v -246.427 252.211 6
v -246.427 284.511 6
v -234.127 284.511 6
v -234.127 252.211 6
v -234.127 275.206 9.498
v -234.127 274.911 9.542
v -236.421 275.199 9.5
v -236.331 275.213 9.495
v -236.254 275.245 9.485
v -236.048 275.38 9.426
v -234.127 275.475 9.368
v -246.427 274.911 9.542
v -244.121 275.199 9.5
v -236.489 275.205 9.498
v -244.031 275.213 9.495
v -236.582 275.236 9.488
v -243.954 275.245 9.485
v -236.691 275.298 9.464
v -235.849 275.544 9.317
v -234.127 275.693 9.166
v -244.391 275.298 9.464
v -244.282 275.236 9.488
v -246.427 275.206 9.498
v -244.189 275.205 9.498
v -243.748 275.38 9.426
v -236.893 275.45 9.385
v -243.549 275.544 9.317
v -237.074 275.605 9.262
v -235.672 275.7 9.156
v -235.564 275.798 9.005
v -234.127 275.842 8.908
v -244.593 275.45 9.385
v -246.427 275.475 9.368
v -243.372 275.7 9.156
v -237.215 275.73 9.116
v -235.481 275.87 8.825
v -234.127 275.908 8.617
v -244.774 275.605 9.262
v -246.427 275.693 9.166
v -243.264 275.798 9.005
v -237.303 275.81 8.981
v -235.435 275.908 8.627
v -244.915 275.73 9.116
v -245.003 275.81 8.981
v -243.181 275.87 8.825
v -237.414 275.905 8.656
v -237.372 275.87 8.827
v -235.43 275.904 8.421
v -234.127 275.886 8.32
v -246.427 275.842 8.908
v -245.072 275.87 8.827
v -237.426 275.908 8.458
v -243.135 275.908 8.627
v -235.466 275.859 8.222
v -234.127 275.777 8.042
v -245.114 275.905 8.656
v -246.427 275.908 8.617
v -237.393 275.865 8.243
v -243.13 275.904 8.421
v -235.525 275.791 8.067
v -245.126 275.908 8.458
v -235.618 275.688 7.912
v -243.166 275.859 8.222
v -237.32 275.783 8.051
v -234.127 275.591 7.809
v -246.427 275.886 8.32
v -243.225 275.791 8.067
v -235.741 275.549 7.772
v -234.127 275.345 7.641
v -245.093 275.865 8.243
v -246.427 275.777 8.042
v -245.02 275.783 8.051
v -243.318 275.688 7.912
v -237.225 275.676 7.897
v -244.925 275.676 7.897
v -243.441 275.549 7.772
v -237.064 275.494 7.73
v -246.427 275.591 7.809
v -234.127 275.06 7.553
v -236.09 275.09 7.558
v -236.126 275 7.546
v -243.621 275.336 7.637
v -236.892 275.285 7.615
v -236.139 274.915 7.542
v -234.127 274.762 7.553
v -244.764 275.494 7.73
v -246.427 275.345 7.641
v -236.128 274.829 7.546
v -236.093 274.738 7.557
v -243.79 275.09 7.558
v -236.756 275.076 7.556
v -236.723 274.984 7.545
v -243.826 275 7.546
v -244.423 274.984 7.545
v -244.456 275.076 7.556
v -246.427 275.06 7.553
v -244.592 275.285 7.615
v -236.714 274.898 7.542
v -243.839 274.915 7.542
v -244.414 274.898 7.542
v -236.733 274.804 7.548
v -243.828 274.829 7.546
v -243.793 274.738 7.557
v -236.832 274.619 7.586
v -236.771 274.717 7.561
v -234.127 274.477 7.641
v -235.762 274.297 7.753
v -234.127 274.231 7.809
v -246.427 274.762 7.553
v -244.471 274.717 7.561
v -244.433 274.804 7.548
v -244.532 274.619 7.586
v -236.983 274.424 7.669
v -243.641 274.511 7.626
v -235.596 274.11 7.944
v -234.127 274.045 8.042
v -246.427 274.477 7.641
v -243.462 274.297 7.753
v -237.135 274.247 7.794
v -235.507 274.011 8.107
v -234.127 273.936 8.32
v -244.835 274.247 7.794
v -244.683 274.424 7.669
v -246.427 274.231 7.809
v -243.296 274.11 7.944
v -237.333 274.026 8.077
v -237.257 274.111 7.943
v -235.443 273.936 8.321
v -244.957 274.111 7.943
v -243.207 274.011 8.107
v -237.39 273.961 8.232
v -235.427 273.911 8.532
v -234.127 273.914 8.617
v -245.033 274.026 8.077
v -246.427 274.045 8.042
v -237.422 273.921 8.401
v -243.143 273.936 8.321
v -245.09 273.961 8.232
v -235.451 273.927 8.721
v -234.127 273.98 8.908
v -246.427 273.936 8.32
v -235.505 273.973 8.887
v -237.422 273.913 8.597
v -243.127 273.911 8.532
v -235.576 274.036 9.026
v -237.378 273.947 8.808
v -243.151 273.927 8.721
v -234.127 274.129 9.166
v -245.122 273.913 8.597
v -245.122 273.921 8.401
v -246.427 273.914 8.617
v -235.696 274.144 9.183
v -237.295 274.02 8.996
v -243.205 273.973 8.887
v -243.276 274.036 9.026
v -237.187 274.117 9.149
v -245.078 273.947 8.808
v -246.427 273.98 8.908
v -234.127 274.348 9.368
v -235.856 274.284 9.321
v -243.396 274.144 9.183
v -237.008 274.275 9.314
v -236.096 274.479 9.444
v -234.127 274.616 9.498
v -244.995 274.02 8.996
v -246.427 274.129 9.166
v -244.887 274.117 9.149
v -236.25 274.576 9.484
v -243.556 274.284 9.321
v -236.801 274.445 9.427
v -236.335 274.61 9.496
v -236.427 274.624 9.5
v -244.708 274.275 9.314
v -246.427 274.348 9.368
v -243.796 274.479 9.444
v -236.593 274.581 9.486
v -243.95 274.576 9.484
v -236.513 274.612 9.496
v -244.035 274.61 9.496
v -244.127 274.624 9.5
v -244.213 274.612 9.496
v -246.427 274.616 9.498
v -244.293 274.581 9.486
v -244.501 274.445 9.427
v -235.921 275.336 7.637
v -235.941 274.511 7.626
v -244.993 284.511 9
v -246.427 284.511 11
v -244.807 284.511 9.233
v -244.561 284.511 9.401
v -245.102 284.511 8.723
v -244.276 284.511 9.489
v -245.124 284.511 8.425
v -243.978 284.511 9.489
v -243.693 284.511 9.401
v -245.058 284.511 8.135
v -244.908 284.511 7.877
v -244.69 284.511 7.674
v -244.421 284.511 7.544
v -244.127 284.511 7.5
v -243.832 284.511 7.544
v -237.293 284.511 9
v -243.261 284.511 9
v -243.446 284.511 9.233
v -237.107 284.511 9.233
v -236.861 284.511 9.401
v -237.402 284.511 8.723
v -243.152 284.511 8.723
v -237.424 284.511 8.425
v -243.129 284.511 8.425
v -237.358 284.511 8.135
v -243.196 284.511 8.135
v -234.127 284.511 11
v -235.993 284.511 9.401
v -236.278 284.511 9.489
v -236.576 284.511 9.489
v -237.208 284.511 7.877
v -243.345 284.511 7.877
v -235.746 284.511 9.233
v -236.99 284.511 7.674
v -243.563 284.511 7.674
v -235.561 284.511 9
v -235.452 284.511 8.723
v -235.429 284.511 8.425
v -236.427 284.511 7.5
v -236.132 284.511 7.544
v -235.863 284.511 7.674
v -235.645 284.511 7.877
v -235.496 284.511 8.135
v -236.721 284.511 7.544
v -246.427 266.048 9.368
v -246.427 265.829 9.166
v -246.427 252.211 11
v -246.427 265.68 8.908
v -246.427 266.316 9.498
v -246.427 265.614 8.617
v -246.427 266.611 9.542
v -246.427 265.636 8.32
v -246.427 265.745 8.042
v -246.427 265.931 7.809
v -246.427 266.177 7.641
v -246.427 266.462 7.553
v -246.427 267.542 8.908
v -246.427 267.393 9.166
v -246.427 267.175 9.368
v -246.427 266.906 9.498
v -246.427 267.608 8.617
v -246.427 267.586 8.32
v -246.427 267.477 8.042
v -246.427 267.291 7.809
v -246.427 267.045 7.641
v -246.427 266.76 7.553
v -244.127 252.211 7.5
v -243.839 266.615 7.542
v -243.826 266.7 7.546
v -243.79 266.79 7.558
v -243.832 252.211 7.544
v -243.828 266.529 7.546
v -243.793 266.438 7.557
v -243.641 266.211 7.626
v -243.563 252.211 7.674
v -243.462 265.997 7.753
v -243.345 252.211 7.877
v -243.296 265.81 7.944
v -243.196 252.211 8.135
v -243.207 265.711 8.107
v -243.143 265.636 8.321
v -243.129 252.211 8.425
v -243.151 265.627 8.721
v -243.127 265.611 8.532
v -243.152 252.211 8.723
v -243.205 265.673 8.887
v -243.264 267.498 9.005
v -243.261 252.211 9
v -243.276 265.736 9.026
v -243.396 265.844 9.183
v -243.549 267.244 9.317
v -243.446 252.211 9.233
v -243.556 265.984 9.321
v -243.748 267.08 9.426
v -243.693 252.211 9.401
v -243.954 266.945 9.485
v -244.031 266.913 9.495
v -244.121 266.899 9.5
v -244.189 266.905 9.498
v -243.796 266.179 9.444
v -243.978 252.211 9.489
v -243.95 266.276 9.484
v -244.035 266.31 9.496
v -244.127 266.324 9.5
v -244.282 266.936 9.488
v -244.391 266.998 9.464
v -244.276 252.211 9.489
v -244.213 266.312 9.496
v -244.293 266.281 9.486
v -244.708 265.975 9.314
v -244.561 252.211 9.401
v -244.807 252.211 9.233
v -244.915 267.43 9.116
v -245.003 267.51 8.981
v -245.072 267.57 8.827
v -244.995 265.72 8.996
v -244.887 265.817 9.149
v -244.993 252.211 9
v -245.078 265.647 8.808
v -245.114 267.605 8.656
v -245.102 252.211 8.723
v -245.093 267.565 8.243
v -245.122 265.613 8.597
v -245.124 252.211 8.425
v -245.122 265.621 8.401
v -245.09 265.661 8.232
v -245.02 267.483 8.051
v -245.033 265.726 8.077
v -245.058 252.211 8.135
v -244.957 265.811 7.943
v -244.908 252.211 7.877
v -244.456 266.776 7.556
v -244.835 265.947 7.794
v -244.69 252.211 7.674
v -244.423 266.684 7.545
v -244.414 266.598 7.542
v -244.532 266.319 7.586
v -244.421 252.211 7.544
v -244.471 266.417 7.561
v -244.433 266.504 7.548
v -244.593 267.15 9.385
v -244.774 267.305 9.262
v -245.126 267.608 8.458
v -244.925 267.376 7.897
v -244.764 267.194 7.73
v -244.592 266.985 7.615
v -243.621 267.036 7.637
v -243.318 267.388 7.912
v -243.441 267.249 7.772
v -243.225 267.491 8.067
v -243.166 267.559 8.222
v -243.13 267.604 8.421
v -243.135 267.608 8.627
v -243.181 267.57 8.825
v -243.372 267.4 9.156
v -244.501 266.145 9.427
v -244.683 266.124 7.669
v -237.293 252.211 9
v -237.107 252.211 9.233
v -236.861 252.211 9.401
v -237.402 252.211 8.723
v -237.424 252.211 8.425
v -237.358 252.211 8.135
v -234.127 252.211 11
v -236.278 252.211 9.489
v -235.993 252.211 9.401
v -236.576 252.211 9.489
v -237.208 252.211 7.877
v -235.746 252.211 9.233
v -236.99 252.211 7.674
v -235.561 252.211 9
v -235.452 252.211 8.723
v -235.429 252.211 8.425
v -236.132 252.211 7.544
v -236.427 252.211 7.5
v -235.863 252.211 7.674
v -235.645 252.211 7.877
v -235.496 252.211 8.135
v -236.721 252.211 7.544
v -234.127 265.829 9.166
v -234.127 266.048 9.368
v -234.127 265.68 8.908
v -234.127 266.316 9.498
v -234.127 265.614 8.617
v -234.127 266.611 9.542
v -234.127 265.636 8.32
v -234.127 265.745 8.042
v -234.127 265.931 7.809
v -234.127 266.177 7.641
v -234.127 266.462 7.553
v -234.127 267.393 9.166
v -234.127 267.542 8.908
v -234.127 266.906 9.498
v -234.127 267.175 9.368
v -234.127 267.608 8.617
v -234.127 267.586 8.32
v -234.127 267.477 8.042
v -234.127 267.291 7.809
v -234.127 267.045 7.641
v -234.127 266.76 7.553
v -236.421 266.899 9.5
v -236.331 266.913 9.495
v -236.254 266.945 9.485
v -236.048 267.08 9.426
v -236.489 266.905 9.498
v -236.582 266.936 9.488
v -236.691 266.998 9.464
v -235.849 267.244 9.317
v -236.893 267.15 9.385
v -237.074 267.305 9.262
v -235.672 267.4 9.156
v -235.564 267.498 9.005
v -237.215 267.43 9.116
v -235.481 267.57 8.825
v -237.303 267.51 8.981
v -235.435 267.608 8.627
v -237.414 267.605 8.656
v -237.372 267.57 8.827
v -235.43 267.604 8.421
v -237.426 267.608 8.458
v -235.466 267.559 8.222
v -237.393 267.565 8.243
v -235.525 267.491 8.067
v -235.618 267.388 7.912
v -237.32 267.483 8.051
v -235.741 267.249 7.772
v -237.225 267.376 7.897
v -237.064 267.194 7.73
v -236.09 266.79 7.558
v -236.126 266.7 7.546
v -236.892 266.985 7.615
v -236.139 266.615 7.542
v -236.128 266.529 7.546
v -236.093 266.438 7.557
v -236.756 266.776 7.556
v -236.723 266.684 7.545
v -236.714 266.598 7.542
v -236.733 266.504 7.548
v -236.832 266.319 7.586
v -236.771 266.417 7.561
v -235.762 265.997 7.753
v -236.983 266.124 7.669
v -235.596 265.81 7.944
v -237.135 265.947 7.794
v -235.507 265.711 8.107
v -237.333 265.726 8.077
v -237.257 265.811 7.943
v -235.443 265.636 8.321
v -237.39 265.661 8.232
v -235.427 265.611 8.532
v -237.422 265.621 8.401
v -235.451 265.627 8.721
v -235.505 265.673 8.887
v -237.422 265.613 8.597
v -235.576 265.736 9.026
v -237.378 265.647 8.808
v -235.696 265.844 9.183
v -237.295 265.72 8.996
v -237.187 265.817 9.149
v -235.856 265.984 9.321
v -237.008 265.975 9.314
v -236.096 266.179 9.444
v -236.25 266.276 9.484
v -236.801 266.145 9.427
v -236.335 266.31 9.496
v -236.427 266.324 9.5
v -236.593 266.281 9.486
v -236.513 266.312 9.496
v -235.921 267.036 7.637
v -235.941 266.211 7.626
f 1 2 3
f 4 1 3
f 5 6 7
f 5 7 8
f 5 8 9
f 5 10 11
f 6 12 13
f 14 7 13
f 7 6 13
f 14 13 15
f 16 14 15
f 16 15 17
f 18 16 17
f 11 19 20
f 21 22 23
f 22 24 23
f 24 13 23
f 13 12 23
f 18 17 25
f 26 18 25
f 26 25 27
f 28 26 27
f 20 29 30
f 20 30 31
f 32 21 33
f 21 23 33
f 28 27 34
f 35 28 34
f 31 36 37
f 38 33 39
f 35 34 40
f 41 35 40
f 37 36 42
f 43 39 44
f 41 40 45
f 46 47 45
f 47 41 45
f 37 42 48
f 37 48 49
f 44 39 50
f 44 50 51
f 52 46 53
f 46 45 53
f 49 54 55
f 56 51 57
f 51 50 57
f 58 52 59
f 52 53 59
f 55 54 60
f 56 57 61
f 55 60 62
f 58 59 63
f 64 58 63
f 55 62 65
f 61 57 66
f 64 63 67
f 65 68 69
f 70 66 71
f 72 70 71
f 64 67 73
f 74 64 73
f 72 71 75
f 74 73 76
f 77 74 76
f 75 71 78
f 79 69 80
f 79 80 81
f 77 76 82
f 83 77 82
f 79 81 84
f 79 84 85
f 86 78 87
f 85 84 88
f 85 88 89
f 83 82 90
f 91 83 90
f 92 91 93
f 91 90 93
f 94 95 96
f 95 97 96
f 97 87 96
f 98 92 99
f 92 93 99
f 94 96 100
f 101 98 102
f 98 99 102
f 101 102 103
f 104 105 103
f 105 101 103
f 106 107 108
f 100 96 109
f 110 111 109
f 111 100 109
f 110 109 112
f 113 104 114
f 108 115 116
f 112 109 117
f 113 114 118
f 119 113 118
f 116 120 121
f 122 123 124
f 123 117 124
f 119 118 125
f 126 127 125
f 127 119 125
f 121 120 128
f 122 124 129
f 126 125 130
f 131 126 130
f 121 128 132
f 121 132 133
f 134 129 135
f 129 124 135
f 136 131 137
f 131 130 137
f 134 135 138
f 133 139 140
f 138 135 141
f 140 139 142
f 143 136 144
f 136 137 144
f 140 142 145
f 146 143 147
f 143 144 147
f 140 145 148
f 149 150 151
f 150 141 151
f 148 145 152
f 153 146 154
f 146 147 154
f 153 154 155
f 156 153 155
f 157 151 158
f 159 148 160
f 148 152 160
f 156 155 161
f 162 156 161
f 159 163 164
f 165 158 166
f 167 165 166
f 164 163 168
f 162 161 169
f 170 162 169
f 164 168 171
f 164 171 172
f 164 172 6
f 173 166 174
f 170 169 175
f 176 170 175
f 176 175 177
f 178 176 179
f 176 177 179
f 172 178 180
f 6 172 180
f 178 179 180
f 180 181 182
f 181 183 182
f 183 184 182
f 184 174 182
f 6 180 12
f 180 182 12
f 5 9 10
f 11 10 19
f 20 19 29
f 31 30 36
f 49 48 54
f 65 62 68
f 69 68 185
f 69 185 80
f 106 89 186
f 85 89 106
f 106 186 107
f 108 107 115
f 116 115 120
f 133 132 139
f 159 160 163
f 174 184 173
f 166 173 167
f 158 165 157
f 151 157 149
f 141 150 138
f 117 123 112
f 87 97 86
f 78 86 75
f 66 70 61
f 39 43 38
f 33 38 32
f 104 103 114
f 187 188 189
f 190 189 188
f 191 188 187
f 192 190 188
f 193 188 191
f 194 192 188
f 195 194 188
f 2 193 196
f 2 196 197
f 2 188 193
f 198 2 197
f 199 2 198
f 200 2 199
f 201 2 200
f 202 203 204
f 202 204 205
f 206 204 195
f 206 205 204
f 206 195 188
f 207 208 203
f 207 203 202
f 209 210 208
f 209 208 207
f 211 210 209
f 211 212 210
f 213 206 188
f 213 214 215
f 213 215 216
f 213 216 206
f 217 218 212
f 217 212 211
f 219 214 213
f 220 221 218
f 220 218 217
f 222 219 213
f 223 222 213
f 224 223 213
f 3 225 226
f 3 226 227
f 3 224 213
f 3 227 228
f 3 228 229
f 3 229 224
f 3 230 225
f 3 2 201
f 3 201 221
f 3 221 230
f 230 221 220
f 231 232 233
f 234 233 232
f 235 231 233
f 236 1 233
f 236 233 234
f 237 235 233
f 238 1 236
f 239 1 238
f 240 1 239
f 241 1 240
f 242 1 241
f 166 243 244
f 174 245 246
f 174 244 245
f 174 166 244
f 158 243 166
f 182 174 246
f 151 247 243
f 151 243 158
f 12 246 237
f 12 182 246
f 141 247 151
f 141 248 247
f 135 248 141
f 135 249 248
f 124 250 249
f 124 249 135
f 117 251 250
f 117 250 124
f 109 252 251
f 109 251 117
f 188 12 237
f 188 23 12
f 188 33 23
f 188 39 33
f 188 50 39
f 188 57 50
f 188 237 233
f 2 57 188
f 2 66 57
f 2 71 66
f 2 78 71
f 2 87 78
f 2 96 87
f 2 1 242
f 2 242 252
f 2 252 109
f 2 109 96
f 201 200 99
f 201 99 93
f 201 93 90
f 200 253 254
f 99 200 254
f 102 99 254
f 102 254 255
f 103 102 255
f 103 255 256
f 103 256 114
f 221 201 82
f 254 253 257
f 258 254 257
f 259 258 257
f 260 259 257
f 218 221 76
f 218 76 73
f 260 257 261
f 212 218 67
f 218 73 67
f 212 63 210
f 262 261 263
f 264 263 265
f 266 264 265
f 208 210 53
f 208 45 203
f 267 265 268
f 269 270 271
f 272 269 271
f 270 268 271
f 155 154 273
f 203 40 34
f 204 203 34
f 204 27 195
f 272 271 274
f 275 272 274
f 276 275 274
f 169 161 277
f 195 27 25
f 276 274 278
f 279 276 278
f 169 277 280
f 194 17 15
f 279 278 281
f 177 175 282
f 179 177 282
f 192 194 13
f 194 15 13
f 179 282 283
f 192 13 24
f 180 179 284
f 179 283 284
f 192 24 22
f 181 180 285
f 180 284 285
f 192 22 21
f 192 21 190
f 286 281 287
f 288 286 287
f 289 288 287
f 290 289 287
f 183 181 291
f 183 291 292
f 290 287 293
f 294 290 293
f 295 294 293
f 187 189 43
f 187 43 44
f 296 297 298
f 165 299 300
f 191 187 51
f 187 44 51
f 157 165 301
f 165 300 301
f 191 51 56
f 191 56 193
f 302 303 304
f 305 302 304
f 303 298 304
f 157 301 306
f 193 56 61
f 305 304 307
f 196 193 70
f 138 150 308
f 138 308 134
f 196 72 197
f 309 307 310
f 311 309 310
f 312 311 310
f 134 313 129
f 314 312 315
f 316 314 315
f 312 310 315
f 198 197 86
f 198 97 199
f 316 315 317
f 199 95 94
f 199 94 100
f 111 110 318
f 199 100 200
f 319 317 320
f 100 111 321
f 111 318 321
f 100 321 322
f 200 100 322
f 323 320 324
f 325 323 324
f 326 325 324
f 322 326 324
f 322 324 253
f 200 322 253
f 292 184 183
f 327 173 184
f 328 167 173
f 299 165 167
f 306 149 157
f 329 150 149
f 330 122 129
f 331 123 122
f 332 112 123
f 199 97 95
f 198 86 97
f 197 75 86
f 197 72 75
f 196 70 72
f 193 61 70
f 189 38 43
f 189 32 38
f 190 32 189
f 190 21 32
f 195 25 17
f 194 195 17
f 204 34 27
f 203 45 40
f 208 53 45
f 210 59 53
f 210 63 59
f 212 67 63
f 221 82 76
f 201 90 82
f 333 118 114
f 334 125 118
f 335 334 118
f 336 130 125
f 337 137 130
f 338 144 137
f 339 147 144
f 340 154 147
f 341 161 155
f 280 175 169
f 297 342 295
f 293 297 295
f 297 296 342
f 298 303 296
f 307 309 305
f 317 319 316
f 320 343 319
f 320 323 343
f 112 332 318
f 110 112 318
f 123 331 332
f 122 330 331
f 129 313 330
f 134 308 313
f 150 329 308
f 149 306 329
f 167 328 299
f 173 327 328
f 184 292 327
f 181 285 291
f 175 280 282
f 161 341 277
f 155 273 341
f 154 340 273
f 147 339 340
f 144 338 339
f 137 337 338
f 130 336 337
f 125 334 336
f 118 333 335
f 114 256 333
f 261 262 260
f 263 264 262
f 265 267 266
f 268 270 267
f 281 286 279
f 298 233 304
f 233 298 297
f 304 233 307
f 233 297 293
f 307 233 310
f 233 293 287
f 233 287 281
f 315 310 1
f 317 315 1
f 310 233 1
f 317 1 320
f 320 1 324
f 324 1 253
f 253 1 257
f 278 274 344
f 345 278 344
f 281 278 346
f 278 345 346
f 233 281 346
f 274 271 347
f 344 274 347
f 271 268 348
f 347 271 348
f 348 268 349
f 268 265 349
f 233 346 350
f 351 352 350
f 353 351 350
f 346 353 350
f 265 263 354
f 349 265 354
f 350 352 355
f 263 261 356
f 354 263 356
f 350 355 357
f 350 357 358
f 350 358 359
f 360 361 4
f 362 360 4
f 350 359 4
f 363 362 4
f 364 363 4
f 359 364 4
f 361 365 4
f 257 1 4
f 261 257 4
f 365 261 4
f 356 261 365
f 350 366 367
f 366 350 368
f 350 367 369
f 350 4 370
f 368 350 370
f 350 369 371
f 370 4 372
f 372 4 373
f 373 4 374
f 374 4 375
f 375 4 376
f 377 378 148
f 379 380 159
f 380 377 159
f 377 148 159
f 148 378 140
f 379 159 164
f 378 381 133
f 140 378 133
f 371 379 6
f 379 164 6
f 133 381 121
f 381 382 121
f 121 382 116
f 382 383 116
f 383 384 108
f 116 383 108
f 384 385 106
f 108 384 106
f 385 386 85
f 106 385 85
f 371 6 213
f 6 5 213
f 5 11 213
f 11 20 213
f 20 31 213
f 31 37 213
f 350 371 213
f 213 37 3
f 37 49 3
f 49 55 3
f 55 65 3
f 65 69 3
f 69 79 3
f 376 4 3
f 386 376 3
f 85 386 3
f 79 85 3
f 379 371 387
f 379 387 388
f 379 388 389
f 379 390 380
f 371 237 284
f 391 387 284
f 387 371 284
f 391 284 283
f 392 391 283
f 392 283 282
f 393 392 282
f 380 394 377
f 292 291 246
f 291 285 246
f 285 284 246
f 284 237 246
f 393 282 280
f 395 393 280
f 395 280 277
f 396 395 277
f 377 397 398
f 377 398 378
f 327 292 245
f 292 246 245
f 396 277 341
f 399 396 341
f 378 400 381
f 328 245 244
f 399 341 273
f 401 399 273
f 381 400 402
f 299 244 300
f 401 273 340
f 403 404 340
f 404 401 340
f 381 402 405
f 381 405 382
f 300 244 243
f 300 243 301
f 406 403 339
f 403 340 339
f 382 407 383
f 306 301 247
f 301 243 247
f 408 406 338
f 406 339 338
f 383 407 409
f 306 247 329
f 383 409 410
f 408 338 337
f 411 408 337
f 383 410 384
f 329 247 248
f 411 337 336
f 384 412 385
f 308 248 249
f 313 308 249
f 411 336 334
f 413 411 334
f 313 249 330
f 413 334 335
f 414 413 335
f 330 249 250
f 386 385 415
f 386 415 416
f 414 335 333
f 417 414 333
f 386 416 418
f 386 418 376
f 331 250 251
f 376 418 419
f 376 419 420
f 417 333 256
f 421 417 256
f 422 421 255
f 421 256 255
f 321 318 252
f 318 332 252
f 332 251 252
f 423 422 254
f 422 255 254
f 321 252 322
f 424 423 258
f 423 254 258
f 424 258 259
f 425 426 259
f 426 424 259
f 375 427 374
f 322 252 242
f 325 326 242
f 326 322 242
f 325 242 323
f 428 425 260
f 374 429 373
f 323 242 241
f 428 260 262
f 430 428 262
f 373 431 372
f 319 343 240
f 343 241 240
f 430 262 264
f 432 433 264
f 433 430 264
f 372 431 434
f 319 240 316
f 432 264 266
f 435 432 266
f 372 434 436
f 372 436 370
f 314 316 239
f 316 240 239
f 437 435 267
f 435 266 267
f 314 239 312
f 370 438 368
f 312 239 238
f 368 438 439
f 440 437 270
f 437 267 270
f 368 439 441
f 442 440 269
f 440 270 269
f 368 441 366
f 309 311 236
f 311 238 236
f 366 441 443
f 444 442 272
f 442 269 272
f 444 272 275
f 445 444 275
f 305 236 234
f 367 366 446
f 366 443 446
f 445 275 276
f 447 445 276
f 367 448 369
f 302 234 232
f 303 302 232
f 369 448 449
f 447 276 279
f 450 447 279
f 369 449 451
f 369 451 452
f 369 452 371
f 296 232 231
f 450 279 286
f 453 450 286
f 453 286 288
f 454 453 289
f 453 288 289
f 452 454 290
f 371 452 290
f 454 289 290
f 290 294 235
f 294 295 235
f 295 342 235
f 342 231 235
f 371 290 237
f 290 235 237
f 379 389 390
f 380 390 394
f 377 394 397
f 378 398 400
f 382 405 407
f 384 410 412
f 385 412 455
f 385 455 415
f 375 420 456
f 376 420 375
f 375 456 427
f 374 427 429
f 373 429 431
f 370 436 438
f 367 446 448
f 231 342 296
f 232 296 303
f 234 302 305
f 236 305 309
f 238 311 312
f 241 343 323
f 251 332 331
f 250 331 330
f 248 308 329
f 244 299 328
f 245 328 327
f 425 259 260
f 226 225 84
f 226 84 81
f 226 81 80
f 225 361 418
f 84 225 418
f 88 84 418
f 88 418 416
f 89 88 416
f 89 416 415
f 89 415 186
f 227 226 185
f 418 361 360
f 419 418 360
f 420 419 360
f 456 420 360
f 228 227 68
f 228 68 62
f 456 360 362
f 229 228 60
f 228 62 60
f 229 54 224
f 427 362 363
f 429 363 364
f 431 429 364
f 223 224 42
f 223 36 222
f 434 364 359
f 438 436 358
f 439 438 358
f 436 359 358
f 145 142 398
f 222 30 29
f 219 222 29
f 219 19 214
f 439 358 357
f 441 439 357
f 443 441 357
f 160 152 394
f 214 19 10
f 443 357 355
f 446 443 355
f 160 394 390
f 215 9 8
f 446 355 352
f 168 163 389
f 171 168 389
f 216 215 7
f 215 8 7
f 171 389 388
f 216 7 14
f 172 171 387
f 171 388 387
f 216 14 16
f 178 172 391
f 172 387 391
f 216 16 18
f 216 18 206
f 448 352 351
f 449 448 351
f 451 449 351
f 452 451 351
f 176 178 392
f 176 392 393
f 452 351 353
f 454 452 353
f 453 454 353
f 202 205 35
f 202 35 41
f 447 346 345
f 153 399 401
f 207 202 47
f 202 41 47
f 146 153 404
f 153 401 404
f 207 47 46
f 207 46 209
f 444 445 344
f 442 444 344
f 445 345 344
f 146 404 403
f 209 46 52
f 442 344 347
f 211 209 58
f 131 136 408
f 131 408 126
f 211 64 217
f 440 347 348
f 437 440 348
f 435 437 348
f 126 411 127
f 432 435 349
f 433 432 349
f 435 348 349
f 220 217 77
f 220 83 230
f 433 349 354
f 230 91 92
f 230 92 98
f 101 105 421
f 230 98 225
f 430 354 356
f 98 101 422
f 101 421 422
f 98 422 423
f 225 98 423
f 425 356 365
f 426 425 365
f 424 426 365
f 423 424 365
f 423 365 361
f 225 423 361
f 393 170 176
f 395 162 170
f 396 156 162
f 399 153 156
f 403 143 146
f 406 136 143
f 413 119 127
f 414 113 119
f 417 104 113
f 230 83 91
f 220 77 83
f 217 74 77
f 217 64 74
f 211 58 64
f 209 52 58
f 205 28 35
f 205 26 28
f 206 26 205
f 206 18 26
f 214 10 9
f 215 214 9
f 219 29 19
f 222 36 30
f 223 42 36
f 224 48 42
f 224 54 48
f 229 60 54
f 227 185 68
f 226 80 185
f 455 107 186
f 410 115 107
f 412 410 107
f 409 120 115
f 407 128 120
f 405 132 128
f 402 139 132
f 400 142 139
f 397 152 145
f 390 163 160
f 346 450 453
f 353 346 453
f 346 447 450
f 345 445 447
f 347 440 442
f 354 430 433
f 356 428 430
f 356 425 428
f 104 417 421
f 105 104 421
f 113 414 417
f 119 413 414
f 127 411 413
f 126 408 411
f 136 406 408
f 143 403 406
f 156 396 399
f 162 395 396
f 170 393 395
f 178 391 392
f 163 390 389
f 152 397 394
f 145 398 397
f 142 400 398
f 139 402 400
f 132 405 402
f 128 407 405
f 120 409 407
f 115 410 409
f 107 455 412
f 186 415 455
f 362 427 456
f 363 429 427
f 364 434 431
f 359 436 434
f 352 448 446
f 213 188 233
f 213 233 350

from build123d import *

# Parameters (mm, degrees)
SKETCH1_W           = 12.3
SKETCH1_H           = 32.3
BOSS_EXTRUDE1_DEPTH = 5
SKETCH3_R           = 1
CUT_EXTRUDE1_DEPTH  = 285.989327178
SKETCH4_R           = 1
CUT_EXTRUDE2_DEPTH  = 249.777773307


with BuildPart() as part:
    # Sketch1 → Boss-Extrude1 (new body)
    with BuildSketch(Plane.XY.offset(6)):
        with Locations((-240.276643226, 268.361206467)):
            Rectangle(SKETCH1_W, SKETCH1_H)
    extrude(amount=BOSS_EXTRUDE1_DEPTH)

    # Sketch3 → Cut-Extrude1 (cut, through all)
    with BuildSketch(Plane.ZY.offset(246.426643226)):
        with Locations((8.542189851, 274.911206467)):
            Circle(SKETCH3_R)
        with Locations((8.542189851, 266.611206467)):
            Circle(SKETCH3_R)
    extrude(amount=-CUT_EXTRUDE1_DEPTH, mode=Mode.SUBTRACT)

    # Sketch4 → Cut-Extrude2 (cut, through all)
    with BuildSketch(Plane(origin=(0, 252.211206467, 0), x_dir=(-1, 0, 0), z_dir=(0, -1, 0))):
        with Locations(Location((244.126643226, -8.5, 0), (0, 0, 90))):
            Circle(SKETCH4_R)
        with Locations(Location((236.426643226, -8.5, 0), (0, 0, 90))):
            Circle(SKETCH4_R)
    extrude(amount=-CUT_EXTRUDE2_DEPTH, mode=Mode.SUBTRACT)


solid = part.part
